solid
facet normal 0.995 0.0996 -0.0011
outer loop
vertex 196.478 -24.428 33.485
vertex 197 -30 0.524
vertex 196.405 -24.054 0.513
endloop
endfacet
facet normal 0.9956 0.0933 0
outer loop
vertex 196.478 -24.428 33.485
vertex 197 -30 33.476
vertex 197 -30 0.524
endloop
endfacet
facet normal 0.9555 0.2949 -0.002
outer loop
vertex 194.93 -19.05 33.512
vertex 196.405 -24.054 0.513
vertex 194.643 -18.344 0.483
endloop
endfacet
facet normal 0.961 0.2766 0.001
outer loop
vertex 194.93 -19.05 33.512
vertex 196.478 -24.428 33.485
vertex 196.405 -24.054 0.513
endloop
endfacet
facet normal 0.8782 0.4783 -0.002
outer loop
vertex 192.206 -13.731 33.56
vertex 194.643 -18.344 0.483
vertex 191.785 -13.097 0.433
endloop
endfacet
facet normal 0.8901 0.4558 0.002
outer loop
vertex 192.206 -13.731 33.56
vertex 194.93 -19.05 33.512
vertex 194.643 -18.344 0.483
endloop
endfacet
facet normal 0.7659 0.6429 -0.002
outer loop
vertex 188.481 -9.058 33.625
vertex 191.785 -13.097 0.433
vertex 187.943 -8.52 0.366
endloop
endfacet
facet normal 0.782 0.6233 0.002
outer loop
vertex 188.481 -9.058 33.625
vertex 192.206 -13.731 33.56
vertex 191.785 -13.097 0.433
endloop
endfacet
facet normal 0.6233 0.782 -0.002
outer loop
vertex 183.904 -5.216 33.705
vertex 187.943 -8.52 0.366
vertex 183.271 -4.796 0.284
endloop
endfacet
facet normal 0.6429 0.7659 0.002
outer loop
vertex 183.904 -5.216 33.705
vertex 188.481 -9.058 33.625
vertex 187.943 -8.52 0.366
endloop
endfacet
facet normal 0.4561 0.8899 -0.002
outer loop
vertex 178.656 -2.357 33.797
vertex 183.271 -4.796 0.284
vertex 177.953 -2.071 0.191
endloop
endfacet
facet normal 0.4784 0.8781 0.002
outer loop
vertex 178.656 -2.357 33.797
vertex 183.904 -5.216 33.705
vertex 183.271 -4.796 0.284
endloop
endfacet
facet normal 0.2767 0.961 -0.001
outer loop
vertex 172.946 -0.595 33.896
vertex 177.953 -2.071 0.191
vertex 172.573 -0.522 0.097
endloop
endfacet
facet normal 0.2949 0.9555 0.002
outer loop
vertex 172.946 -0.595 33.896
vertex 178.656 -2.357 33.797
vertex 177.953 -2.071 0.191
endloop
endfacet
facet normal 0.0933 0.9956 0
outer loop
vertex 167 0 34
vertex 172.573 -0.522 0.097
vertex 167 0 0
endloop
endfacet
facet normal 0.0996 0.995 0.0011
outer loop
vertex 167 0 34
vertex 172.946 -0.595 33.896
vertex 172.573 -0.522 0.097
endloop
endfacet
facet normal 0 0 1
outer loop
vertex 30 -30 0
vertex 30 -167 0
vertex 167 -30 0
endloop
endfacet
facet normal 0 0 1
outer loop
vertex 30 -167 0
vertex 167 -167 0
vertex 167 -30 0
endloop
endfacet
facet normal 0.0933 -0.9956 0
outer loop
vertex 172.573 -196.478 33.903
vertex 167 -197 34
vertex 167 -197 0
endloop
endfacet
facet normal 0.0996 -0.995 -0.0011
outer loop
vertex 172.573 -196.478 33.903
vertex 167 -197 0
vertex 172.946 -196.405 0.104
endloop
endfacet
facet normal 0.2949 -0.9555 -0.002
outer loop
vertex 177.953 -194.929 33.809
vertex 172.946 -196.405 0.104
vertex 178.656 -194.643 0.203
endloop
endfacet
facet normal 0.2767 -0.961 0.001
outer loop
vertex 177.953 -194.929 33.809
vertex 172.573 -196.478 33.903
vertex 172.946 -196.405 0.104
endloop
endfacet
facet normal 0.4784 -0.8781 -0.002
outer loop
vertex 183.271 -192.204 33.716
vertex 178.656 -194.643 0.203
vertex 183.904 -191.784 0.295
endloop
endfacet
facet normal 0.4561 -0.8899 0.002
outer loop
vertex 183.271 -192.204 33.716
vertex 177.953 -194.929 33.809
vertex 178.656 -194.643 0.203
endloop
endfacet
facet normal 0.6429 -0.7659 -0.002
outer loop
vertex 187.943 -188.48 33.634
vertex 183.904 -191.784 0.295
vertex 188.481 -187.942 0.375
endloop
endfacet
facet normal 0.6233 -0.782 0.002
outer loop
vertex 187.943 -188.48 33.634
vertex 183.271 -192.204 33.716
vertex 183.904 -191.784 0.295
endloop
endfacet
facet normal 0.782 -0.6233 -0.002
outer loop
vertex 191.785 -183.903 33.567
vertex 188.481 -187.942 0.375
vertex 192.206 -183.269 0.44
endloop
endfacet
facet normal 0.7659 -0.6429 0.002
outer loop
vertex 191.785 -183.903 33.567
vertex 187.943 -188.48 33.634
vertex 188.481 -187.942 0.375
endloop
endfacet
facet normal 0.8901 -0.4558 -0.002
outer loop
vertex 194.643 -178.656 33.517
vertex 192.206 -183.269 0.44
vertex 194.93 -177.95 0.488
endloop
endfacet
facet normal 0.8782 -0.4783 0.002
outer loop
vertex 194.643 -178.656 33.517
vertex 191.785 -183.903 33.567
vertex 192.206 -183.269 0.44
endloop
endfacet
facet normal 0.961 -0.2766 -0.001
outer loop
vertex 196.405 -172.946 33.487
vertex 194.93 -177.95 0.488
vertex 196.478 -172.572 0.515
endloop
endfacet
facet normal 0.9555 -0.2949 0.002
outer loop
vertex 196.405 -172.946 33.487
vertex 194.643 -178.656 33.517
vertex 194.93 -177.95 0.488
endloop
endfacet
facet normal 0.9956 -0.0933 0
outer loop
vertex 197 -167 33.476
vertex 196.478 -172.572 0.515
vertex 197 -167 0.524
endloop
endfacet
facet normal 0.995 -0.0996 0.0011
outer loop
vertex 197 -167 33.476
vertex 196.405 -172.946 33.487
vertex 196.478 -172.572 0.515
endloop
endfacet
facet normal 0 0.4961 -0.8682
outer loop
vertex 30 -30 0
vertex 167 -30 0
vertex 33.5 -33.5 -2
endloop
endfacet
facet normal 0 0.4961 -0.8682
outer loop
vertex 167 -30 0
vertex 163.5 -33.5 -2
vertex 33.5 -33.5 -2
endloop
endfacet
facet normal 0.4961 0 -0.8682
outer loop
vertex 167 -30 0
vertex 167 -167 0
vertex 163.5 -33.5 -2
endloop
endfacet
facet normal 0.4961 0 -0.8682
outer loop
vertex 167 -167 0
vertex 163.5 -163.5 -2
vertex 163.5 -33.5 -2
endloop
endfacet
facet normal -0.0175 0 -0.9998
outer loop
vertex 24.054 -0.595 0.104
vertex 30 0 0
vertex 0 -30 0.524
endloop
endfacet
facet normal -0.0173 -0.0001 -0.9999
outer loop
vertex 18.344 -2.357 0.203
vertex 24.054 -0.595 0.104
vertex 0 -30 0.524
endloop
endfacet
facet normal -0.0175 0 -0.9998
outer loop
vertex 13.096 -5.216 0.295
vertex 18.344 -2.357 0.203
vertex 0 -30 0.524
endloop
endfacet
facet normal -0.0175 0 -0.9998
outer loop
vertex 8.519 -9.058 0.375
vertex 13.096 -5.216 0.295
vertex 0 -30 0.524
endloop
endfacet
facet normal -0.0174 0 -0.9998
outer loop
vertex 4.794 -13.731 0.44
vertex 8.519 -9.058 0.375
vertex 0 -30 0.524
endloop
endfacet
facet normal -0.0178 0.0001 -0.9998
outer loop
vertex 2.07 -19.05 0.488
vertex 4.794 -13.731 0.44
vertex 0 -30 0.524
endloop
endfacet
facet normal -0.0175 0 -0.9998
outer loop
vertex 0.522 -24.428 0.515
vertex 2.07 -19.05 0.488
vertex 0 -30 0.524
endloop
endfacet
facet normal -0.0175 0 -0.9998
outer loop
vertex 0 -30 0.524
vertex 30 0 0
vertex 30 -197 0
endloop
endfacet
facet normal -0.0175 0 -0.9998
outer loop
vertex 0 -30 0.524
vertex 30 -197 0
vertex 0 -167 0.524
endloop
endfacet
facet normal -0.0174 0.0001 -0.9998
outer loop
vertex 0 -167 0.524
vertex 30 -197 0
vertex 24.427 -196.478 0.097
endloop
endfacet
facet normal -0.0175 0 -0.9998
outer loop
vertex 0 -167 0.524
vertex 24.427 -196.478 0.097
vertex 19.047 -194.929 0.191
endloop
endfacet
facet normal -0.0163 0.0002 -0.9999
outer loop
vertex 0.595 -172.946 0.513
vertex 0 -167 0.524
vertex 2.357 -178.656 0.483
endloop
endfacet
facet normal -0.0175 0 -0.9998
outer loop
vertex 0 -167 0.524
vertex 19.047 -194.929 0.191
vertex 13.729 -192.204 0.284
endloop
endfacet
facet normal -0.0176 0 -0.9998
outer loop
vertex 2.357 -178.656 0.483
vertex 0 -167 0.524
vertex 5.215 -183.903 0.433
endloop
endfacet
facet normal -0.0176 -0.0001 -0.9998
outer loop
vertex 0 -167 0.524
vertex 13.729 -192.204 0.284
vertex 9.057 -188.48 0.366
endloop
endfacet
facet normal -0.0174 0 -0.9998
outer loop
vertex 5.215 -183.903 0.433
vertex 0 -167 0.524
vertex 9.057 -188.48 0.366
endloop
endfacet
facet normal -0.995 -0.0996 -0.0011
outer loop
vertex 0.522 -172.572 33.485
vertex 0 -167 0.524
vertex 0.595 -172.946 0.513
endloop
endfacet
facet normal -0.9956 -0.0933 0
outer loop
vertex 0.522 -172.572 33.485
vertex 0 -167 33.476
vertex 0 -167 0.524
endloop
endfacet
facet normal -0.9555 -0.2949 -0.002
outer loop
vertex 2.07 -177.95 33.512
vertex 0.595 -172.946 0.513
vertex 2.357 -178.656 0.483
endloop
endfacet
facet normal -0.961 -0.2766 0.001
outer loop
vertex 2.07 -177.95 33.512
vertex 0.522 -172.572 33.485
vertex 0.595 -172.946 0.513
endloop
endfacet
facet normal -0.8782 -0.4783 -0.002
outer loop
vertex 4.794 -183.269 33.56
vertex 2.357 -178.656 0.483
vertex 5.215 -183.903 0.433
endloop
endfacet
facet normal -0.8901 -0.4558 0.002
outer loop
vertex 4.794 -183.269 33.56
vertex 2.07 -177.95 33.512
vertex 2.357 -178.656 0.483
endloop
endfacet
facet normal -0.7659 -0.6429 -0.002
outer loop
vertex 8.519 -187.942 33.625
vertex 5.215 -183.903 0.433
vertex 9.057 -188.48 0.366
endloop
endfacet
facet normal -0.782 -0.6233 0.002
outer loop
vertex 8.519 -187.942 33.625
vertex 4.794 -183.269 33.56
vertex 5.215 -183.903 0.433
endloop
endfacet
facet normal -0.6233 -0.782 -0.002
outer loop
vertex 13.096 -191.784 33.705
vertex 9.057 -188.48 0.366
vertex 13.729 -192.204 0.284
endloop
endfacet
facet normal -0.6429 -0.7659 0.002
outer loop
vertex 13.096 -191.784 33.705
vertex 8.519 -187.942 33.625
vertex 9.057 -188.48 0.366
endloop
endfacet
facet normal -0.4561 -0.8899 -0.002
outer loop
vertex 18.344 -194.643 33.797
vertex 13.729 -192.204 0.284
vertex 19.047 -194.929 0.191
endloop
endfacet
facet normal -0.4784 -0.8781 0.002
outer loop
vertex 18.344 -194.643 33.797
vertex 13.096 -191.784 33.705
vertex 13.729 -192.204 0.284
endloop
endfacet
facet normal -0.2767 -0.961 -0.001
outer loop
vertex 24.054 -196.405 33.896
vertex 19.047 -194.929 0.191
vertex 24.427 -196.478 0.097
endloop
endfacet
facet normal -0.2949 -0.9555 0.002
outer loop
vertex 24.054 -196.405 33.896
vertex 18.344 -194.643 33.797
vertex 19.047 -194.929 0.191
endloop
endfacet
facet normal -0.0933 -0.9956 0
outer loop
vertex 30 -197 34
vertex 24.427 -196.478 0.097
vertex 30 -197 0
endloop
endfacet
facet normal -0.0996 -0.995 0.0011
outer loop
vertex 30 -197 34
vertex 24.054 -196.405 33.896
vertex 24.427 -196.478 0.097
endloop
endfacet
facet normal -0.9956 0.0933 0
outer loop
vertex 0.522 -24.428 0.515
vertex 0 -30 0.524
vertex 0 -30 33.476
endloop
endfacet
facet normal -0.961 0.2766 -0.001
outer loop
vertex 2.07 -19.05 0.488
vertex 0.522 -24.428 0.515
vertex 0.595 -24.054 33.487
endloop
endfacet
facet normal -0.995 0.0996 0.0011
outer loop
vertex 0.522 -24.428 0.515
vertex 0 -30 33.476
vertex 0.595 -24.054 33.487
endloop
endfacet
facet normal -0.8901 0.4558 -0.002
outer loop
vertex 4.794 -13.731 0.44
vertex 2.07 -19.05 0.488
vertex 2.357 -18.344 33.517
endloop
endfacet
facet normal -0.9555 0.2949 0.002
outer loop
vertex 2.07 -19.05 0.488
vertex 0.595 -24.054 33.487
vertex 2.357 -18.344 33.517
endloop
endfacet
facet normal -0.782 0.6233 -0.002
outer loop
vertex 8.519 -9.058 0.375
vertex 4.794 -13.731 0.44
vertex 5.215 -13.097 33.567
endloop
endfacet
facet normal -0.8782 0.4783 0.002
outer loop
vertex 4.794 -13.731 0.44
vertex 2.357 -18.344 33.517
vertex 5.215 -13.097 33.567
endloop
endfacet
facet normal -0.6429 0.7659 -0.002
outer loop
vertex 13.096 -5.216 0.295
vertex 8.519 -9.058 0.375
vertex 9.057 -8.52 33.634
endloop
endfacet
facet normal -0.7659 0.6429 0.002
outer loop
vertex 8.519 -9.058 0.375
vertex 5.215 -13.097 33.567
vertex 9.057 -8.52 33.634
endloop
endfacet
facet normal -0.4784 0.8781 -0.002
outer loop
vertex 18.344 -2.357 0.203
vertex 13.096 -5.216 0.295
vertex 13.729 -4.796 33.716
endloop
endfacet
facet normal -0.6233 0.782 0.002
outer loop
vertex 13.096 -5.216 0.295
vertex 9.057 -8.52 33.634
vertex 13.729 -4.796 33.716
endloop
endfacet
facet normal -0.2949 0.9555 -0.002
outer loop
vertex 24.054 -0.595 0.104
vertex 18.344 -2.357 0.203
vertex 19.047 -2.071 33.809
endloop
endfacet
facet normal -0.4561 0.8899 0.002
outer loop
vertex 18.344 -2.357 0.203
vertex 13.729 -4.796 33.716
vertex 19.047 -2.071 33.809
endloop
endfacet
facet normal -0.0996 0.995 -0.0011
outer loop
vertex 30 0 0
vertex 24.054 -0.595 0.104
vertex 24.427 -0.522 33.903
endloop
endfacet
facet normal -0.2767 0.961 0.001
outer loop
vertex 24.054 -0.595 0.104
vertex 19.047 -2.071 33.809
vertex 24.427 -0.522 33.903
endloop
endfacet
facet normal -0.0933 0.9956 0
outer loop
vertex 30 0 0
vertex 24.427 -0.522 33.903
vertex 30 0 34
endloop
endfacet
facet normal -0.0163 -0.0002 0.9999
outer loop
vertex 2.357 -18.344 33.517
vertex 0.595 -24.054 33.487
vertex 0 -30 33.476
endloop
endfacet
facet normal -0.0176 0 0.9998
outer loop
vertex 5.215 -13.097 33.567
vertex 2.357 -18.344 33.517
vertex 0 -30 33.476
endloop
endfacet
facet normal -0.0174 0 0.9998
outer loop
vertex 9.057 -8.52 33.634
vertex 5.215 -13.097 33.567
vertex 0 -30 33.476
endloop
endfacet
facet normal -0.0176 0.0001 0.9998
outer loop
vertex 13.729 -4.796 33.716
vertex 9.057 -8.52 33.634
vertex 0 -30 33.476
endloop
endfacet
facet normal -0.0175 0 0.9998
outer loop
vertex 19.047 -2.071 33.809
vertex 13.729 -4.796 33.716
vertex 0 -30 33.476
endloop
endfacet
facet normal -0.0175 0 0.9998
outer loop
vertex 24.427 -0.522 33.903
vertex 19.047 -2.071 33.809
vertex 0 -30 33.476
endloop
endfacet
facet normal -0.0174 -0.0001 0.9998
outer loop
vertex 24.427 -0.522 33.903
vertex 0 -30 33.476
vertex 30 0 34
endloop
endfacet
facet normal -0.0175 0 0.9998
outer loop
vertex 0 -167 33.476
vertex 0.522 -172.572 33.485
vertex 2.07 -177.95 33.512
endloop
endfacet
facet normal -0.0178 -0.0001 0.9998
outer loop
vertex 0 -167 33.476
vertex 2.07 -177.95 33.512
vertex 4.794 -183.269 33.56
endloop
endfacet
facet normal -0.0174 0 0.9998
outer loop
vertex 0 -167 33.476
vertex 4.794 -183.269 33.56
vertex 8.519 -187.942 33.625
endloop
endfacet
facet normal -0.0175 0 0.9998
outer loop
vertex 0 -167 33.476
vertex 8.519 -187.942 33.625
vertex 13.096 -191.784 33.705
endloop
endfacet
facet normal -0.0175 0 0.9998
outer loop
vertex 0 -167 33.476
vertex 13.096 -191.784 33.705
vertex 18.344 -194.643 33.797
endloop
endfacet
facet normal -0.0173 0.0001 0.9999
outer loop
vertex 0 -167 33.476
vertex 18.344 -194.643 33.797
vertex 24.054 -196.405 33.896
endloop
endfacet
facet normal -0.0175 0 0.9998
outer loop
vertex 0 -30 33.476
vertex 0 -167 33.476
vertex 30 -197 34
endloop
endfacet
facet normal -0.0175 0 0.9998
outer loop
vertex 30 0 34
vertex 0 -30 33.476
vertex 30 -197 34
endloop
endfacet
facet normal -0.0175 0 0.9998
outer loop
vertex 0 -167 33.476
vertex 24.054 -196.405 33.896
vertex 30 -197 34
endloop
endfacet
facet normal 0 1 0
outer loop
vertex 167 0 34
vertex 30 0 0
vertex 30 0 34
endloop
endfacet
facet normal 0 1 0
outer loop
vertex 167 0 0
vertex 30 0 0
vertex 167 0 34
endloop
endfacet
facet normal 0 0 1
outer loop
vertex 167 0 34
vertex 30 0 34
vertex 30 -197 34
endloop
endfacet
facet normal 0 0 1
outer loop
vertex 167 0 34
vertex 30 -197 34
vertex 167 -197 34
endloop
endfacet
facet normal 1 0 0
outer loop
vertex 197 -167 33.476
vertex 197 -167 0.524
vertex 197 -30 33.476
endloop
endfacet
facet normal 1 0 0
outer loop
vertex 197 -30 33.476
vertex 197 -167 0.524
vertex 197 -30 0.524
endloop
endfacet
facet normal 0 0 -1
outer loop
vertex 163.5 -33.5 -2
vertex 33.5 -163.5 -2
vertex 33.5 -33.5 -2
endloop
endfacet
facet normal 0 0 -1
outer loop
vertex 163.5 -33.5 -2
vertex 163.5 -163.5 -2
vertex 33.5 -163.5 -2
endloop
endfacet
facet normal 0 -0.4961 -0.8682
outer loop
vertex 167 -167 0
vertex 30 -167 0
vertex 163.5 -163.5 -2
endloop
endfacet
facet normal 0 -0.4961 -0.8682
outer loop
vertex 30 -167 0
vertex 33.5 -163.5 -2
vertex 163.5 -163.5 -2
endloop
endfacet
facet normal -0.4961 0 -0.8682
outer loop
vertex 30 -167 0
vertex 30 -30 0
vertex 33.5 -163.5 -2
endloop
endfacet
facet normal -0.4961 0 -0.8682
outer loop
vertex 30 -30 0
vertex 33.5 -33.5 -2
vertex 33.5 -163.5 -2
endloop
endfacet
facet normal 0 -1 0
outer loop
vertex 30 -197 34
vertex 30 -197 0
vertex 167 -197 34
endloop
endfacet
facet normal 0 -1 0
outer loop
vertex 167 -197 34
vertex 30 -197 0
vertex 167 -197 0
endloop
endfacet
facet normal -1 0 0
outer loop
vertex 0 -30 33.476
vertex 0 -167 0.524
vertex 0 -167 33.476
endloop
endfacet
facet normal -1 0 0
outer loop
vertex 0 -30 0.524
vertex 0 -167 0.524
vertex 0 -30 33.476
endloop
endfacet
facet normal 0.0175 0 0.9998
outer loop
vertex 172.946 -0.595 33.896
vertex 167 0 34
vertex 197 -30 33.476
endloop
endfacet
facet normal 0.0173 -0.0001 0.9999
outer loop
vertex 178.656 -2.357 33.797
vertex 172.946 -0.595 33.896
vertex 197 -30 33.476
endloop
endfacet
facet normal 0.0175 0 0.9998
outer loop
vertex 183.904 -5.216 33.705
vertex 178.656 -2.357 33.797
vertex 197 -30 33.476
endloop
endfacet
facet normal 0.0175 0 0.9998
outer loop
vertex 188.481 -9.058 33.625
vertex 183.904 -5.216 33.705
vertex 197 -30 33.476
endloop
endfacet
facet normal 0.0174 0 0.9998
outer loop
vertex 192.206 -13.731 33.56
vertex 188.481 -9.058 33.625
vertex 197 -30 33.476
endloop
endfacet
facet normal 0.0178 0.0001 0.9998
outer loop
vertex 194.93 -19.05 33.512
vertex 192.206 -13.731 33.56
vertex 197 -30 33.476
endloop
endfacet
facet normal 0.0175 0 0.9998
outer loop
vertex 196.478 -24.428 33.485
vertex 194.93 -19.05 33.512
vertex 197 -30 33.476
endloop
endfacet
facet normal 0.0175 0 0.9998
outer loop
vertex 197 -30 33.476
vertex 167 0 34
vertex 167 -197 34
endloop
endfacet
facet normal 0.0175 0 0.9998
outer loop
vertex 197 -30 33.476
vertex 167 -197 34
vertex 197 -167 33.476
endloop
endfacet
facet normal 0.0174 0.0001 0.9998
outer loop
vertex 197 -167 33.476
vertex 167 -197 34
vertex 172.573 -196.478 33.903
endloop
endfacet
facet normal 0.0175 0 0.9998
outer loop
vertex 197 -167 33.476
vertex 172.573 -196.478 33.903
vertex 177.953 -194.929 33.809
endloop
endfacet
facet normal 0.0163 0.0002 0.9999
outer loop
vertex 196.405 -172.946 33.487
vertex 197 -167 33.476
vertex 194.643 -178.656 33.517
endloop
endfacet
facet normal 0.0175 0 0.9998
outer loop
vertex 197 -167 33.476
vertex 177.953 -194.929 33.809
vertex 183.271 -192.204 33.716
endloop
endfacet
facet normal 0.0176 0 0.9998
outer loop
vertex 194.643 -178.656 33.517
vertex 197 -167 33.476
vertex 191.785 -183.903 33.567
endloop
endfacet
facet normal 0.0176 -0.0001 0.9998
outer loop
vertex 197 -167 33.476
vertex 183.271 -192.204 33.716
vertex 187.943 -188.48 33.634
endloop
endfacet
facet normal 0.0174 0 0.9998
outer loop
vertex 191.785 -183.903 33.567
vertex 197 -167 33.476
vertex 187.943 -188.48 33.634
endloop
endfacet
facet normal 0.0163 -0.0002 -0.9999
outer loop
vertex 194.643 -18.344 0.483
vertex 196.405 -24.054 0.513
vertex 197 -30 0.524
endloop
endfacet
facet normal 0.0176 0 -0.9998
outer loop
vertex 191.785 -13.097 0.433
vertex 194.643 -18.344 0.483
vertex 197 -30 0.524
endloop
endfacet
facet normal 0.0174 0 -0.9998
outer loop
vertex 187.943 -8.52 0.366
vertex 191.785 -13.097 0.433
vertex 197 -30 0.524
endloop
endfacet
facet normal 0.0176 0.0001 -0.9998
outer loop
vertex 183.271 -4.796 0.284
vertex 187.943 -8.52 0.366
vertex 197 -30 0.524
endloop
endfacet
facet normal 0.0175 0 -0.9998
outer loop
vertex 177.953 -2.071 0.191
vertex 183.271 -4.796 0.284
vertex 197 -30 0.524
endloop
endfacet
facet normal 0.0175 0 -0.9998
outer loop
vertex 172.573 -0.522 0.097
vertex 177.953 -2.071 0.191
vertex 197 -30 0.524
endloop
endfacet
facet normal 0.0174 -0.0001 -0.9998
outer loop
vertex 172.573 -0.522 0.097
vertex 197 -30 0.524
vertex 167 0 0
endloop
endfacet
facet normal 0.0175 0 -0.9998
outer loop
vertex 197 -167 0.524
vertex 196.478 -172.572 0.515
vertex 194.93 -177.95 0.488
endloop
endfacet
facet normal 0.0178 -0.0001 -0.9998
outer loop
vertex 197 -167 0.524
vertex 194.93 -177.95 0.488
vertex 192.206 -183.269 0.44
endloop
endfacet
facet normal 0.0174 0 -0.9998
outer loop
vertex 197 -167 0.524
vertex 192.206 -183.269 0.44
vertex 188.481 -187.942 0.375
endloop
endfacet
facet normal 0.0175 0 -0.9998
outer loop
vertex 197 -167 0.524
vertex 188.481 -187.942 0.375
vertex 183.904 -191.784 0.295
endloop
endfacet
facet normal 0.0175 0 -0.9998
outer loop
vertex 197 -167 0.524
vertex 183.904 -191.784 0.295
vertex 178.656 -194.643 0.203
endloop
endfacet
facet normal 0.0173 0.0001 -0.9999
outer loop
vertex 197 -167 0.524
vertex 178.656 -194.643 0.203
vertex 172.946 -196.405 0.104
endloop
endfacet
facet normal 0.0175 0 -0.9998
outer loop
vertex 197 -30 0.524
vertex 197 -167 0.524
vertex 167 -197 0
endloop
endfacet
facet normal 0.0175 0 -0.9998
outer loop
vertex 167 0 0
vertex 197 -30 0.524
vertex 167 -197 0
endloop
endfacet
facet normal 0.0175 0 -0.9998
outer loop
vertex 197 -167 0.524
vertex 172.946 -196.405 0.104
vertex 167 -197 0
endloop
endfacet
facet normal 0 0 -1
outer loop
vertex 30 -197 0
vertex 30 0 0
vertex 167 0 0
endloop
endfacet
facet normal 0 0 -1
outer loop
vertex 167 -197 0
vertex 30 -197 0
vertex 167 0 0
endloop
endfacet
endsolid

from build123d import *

# Parameters (mm, degrees)
F0_W     = 197
F0_H     = 197
F1_DEPTH = 34
F2_R     = 30
F5_DEPTH = 197


with BuildPart() as f1:
    # F0 (on Top) → F1 (new body)
    with BuildSketch(Plane.XY):
        with Locations((98.5, -98.5)):
            Rectangle(F0_W, F0_H)
    extrude(amount=F1_DEPTH)

    # F2
    f2_edges = [f1.edges().sort_by_distance(p)[0] for p in [
        (197, -197, 17),
        (197, 0, 17),
        (0, 0, 17),
        (0, -197, 17),
    ]]
    fillet(f2_edges, radius=F2_R)

    # F4 (on offset) → F5 (cut)
    with BuildSketch(Plane.XZ.offset(197)):
        Polygon((197, 34), (167, 34), (197, 33.476348), align=None)
        Polygon((0, 0.523652), (0, 0), (30, 0), align=None)
        Polygon((197, 0.523652), (167, 0), (197, 0), align=None)
        Polygon((30, 34), (0, 34), (0, 33.476348), align=None)
    extrude(amount=-F5_DEPTH, mode=Mode.SUBTRACT)


with BuildPart() as f9:
    # F6 (on Top) → F9 section 0
    with BuildSketch(Plane.XY):
        Polygon((30, -167), (167, -167), (167, -30), (98.5, -30), (30, -30), align=None)
    # F8 (on offset) → F9 section 1
    with BuildSketch(Plane.XY.offset(-2)):
        Polygon((33.5, -163.5), (163.5, -163.5), (163.5, -33.5), (98.5, -33.5), (33.5, -33.5), align=None)
    loft()


solid = Compound([f1.part, f9.part])
